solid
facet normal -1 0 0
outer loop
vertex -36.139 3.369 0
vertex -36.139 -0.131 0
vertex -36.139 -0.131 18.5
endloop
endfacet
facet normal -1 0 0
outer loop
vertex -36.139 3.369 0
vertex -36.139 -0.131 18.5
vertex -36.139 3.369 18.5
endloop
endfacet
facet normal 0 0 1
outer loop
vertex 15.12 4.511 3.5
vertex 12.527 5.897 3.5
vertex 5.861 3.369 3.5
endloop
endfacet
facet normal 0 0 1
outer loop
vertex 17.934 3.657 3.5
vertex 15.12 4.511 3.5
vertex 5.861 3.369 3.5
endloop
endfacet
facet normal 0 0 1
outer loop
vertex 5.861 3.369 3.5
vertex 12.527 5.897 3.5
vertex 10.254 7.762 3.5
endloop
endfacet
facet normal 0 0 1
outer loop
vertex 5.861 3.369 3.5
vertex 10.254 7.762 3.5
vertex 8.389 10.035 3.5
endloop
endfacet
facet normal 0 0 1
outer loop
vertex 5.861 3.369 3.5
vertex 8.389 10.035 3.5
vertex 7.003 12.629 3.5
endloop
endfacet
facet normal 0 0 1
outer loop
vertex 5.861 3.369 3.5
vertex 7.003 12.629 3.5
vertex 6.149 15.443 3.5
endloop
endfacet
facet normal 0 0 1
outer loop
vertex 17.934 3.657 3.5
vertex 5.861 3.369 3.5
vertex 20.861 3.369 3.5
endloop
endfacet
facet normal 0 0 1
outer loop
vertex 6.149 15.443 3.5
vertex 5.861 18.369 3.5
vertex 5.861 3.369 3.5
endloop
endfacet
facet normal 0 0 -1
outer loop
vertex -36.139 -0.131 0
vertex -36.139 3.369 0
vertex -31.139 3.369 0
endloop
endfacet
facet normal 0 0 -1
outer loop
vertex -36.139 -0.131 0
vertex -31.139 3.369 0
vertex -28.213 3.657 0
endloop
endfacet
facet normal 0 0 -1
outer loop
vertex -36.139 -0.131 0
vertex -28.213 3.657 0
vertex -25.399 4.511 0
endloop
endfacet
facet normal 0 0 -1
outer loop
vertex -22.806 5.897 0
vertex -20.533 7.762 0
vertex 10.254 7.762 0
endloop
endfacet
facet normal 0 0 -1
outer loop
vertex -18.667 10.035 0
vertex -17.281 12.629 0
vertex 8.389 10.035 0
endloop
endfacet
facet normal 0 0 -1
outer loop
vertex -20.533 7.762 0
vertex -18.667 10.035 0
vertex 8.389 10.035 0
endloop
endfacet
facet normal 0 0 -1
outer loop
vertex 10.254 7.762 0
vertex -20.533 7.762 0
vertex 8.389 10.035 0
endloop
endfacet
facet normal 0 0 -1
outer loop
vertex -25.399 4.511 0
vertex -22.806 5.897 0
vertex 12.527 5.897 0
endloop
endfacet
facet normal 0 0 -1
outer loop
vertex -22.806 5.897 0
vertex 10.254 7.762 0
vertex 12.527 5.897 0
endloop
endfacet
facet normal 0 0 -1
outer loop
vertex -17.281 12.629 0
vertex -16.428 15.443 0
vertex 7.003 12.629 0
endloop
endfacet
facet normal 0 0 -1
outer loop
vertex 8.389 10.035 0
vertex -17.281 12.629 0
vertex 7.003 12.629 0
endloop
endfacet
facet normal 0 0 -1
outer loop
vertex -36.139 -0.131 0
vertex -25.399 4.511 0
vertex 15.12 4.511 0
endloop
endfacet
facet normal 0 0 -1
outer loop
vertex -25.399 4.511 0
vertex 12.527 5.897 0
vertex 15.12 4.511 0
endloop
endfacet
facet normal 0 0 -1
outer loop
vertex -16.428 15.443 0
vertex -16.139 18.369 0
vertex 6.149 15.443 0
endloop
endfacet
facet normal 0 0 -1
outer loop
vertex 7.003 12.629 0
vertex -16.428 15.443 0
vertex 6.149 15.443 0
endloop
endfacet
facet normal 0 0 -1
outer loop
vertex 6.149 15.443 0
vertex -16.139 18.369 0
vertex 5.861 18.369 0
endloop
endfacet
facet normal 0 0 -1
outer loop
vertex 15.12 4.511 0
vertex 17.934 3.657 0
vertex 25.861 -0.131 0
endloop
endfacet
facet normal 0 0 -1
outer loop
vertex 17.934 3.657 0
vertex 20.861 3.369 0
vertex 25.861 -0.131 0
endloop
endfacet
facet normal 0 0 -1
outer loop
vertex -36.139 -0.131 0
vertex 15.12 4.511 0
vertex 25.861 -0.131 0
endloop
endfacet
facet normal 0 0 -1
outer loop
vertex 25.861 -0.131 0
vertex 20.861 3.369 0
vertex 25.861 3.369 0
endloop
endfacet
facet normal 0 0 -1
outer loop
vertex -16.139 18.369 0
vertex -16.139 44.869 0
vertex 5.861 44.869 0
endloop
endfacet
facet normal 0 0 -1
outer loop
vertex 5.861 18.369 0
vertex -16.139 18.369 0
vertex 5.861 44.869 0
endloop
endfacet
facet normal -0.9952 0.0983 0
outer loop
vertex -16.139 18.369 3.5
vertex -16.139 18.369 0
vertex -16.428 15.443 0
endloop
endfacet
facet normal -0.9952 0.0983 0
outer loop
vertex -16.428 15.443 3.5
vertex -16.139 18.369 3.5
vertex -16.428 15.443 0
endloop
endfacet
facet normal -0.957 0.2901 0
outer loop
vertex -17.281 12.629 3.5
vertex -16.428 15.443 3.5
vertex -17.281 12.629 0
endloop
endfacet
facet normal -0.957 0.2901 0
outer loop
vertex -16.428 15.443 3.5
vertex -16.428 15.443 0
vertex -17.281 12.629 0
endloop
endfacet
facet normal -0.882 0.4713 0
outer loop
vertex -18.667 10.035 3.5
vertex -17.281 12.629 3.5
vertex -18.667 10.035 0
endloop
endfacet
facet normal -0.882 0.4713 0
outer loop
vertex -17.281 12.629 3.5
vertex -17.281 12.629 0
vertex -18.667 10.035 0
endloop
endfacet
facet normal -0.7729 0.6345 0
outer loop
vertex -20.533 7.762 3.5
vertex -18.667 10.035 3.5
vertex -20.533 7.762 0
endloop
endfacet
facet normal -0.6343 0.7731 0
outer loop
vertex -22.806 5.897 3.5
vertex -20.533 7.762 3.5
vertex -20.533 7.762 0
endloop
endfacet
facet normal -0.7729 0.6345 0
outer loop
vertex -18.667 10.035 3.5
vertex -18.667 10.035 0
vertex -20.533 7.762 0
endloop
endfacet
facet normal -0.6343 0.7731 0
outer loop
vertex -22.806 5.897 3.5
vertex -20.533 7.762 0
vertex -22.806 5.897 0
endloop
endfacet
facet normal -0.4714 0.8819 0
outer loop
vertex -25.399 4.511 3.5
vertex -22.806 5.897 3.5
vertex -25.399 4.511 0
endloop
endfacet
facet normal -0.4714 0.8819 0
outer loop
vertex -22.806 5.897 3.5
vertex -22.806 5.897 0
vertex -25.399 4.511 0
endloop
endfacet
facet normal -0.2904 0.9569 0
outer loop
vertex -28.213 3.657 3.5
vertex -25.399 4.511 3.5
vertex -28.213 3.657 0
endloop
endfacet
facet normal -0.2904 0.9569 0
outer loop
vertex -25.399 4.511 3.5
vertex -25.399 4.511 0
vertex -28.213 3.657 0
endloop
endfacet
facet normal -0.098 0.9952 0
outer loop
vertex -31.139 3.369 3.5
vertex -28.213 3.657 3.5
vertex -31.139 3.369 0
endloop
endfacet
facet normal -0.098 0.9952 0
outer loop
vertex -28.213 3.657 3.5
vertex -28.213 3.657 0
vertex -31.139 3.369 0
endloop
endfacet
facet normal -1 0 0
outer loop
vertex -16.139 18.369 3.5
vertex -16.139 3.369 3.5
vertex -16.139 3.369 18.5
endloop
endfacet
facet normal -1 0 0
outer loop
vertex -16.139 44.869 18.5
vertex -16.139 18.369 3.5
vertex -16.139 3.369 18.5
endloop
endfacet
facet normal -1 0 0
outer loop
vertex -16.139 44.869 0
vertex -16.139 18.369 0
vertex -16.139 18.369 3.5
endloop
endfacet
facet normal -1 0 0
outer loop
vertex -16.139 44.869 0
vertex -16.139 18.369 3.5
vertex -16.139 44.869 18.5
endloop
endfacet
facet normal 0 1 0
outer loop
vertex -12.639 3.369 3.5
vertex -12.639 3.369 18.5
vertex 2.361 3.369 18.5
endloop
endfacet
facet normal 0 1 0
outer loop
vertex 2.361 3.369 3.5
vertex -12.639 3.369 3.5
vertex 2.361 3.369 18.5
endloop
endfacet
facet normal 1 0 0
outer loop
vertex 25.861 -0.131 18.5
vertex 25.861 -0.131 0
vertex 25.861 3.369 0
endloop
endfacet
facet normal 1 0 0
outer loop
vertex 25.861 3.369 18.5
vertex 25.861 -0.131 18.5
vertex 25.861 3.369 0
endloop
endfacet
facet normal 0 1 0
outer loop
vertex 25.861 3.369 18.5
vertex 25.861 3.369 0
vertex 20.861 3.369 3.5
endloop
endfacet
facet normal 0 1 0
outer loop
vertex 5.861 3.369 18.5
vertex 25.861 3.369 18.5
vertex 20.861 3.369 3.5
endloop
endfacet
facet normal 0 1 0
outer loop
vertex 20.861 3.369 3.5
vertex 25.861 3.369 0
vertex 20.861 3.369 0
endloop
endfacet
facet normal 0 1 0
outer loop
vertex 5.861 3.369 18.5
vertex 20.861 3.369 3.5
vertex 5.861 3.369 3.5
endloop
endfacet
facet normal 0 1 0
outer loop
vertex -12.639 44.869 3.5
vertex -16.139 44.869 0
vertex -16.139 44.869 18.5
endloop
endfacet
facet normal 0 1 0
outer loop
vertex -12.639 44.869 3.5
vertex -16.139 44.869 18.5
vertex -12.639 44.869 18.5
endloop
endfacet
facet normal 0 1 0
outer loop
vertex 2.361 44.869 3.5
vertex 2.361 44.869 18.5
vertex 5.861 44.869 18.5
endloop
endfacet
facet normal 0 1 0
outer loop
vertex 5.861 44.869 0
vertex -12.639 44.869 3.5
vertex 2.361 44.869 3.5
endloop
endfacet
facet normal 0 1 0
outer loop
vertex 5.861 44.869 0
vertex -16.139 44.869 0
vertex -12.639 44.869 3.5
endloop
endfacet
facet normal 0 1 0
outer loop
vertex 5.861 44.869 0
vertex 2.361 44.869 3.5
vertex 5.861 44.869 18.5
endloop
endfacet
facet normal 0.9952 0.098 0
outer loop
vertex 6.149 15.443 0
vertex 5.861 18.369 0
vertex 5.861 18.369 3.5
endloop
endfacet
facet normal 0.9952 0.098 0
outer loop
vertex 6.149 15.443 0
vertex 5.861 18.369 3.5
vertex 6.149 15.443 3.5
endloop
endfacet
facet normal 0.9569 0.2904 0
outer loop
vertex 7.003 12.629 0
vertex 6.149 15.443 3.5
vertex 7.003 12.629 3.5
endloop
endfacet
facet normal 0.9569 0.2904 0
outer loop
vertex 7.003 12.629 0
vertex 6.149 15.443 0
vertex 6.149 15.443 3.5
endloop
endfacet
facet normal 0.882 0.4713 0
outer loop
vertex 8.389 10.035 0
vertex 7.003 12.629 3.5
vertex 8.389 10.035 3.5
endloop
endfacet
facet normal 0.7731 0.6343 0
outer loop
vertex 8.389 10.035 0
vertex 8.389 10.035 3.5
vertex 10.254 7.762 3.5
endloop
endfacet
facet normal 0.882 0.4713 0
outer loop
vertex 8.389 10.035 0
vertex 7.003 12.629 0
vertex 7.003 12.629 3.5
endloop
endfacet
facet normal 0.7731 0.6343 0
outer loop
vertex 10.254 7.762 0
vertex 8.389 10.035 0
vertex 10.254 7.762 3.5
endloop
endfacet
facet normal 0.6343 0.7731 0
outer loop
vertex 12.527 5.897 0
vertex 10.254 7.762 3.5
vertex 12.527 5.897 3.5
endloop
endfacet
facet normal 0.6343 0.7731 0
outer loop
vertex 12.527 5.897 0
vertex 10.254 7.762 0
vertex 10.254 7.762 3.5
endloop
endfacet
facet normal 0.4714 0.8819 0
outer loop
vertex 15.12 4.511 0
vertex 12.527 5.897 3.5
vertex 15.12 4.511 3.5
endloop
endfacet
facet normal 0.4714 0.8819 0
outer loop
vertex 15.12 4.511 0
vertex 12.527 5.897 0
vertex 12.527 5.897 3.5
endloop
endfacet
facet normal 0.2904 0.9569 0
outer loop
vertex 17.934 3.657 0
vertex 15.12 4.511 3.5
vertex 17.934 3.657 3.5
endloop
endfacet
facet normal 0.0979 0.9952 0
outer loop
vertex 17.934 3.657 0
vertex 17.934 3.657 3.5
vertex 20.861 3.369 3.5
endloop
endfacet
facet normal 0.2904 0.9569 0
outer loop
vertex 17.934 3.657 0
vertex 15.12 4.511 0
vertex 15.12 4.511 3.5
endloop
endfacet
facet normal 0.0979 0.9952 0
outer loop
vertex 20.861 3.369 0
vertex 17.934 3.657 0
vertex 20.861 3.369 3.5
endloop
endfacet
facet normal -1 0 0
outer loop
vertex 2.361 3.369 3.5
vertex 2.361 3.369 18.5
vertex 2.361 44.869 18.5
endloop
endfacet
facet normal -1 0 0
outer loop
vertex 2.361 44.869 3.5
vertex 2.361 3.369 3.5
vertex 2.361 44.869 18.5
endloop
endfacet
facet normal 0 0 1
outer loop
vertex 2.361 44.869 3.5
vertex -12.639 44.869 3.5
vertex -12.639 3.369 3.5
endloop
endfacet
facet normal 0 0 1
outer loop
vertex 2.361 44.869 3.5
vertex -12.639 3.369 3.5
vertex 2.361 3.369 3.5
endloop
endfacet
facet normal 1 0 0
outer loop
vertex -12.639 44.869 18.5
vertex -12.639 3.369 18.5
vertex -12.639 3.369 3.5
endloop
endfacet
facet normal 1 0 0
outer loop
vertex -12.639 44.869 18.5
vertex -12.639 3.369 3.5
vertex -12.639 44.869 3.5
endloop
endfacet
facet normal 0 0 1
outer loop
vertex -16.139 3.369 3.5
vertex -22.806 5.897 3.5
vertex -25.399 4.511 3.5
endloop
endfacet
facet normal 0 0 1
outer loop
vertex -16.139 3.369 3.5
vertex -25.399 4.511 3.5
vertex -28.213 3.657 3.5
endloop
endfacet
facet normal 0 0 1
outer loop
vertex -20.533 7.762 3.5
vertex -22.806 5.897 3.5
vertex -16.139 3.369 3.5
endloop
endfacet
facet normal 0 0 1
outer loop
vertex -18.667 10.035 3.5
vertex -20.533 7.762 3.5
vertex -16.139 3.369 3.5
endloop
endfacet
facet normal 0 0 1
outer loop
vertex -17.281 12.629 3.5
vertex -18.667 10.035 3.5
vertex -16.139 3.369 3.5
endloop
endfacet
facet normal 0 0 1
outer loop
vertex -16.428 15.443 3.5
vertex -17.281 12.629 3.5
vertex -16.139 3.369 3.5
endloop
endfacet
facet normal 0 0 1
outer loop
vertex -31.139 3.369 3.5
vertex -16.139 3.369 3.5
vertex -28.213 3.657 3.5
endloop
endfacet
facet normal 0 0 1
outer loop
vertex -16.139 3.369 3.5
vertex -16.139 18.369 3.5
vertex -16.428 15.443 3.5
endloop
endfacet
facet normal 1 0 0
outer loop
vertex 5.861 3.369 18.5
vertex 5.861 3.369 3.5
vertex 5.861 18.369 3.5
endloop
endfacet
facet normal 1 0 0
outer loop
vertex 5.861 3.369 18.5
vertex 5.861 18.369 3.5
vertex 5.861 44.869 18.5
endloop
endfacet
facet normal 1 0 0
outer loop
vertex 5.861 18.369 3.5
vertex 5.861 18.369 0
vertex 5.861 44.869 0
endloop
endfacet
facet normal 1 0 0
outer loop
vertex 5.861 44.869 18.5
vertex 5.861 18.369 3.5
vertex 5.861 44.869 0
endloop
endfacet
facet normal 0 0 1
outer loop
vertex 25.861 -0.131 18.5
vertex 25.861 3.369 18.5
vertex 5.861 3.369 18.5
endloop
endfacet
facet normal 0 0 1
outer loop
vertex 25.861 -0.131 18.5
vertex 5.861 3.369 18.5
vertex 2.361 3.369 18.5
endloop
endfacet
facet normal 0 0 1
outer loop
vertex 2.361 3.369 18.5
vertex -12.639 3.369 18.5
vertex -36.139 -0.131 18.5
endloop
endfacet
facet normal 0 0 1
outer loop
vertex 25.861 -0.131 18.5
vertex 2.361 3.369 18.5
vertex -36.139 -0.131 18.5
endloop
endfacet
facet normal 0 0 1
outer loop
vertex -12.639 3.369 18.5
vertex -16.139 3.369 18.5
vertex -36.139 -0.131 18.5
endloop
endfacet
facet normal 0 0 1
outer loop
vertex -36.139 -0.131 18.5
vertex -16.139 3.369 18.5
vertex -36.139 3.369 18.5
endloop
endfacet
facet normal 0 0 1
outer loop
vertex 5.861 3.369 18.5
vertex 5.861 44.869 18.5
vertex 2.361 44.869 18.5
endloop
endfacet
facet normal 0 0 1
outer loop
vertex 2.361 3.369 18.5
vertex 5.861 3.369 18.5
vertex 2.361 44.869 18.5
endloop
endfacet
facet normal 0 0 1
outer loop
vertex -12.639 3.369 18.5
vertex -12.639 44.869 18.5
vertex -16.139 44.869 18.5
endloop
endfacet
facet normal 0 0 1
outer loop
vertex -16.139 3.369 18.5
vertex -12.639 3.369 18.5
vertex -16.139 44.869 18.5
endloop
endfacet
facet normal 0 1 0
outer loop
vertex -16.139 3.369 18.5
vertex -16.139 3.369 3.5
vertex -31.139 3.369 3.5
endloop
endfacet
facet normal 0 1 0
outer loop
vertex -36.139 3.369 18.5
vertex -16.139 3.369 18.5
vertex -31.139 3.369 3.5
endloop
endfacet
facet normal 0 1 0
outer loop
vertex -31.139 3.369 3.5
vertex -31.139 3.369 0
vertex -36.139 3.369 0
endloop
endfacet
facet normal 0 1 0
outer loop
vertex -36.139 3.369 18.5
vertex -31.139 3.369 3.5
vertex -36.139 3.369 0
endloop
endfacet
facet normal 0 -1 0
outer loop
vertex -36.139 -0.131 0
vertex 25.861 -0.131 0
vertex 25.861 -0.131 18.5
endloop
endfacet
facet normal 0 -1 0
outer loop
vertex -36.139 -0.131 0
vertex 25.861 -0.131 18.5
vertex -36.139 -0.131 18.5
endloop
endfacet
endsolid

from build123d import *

# Parameters (mm, degrees)
SKETCH1_W           = 22
SKETCH1_H           = 45
BOSS_EXTRUDE1_DEPTH = 18.5
SKETCH2_W           = 15
SKETCH2_H           = 41.5
CUT_EXTRUDE1_DEPTH  = 15
SKETCH3_W           = 20
SKETCH3_H           = 3.5
BOSS_EXTRUDE2_DEPTH = 18.5
BOSS_EXTRUDE3_DEPTH = 3.5


with BuildPart() as part:
    # Sketch1 → Boss-Extrude1 (new body)
    with BuildSketch(Plane.XY):
        with Locations((-5.139289452, 22.368914656)):
            Rectangle(SKETCH1_W, SKETCH1_H)
    extrude(amount=BOSS_EXTRUDE1_DEPTH)

    # Sketch2 → Cut-Extrude1 (cut)
    with BuildSketch(Plane.XY.offset(18.5)):
        with Locations((-5.139289452, 24.118914656)):
            Rectangle(SKETCH2_W, SKETCH2_H)
    extrude(amount=-CUT_EXTRUDE1_DEPTH, mode=Mode.SUBTRACT)

    # Sketch3 → Boss-Extrude2 (add)
    with BuildSketch(Plane(origin=(0, 0, 0), x_dir=(-1, 0, 0), z_dir=(0, 0, -1))):
        with Locations((26.139289452, 1.618914656)):
            Rectangle(SKETCH3_W, SKETCH3_H)
        with Locations((-15.860710548, 1.618914656)):
            Rectangle(SKETCH3_W, SKETCH3_H)
    extrude(amount=-BOSS_EXTRUDE2_DEPTH)

    # Sketch4 → Boss-Extrude3 (add)
    with BuildSketch(Plane(origin=(0, 0, 0), x_dir=(-1, 0, 0), z_dir=(0, 0, -1))):
        with BuildLine():
            Line((31.139289452, 3.368914656), (16.139289452, 3.368914656))
            Line((16.139289452, 3.368914656), (16.139289452, 18.368914656))
            ThreePointArc((16.139289452, 18.368914656), (20.532687735, 7.762312938), (31.139289452, 3.368914656))
        make_face()
        with BuildLine():
            Line((-20.860710548, 3.368914656), (-5.860710548, 3.368914656))
            Line((-5.860710548, 3.368914656), (-5.860710548, 18.368914656))
            ThreePointArc((-5.860710548, 18.368914656), (-10.25410883, 7.762312938), (-20.860710548, 3.368914656))
        make_face()
    extrude(amount=-BOSS_EXTRUDE3_DEPTH)


solid = part.part
